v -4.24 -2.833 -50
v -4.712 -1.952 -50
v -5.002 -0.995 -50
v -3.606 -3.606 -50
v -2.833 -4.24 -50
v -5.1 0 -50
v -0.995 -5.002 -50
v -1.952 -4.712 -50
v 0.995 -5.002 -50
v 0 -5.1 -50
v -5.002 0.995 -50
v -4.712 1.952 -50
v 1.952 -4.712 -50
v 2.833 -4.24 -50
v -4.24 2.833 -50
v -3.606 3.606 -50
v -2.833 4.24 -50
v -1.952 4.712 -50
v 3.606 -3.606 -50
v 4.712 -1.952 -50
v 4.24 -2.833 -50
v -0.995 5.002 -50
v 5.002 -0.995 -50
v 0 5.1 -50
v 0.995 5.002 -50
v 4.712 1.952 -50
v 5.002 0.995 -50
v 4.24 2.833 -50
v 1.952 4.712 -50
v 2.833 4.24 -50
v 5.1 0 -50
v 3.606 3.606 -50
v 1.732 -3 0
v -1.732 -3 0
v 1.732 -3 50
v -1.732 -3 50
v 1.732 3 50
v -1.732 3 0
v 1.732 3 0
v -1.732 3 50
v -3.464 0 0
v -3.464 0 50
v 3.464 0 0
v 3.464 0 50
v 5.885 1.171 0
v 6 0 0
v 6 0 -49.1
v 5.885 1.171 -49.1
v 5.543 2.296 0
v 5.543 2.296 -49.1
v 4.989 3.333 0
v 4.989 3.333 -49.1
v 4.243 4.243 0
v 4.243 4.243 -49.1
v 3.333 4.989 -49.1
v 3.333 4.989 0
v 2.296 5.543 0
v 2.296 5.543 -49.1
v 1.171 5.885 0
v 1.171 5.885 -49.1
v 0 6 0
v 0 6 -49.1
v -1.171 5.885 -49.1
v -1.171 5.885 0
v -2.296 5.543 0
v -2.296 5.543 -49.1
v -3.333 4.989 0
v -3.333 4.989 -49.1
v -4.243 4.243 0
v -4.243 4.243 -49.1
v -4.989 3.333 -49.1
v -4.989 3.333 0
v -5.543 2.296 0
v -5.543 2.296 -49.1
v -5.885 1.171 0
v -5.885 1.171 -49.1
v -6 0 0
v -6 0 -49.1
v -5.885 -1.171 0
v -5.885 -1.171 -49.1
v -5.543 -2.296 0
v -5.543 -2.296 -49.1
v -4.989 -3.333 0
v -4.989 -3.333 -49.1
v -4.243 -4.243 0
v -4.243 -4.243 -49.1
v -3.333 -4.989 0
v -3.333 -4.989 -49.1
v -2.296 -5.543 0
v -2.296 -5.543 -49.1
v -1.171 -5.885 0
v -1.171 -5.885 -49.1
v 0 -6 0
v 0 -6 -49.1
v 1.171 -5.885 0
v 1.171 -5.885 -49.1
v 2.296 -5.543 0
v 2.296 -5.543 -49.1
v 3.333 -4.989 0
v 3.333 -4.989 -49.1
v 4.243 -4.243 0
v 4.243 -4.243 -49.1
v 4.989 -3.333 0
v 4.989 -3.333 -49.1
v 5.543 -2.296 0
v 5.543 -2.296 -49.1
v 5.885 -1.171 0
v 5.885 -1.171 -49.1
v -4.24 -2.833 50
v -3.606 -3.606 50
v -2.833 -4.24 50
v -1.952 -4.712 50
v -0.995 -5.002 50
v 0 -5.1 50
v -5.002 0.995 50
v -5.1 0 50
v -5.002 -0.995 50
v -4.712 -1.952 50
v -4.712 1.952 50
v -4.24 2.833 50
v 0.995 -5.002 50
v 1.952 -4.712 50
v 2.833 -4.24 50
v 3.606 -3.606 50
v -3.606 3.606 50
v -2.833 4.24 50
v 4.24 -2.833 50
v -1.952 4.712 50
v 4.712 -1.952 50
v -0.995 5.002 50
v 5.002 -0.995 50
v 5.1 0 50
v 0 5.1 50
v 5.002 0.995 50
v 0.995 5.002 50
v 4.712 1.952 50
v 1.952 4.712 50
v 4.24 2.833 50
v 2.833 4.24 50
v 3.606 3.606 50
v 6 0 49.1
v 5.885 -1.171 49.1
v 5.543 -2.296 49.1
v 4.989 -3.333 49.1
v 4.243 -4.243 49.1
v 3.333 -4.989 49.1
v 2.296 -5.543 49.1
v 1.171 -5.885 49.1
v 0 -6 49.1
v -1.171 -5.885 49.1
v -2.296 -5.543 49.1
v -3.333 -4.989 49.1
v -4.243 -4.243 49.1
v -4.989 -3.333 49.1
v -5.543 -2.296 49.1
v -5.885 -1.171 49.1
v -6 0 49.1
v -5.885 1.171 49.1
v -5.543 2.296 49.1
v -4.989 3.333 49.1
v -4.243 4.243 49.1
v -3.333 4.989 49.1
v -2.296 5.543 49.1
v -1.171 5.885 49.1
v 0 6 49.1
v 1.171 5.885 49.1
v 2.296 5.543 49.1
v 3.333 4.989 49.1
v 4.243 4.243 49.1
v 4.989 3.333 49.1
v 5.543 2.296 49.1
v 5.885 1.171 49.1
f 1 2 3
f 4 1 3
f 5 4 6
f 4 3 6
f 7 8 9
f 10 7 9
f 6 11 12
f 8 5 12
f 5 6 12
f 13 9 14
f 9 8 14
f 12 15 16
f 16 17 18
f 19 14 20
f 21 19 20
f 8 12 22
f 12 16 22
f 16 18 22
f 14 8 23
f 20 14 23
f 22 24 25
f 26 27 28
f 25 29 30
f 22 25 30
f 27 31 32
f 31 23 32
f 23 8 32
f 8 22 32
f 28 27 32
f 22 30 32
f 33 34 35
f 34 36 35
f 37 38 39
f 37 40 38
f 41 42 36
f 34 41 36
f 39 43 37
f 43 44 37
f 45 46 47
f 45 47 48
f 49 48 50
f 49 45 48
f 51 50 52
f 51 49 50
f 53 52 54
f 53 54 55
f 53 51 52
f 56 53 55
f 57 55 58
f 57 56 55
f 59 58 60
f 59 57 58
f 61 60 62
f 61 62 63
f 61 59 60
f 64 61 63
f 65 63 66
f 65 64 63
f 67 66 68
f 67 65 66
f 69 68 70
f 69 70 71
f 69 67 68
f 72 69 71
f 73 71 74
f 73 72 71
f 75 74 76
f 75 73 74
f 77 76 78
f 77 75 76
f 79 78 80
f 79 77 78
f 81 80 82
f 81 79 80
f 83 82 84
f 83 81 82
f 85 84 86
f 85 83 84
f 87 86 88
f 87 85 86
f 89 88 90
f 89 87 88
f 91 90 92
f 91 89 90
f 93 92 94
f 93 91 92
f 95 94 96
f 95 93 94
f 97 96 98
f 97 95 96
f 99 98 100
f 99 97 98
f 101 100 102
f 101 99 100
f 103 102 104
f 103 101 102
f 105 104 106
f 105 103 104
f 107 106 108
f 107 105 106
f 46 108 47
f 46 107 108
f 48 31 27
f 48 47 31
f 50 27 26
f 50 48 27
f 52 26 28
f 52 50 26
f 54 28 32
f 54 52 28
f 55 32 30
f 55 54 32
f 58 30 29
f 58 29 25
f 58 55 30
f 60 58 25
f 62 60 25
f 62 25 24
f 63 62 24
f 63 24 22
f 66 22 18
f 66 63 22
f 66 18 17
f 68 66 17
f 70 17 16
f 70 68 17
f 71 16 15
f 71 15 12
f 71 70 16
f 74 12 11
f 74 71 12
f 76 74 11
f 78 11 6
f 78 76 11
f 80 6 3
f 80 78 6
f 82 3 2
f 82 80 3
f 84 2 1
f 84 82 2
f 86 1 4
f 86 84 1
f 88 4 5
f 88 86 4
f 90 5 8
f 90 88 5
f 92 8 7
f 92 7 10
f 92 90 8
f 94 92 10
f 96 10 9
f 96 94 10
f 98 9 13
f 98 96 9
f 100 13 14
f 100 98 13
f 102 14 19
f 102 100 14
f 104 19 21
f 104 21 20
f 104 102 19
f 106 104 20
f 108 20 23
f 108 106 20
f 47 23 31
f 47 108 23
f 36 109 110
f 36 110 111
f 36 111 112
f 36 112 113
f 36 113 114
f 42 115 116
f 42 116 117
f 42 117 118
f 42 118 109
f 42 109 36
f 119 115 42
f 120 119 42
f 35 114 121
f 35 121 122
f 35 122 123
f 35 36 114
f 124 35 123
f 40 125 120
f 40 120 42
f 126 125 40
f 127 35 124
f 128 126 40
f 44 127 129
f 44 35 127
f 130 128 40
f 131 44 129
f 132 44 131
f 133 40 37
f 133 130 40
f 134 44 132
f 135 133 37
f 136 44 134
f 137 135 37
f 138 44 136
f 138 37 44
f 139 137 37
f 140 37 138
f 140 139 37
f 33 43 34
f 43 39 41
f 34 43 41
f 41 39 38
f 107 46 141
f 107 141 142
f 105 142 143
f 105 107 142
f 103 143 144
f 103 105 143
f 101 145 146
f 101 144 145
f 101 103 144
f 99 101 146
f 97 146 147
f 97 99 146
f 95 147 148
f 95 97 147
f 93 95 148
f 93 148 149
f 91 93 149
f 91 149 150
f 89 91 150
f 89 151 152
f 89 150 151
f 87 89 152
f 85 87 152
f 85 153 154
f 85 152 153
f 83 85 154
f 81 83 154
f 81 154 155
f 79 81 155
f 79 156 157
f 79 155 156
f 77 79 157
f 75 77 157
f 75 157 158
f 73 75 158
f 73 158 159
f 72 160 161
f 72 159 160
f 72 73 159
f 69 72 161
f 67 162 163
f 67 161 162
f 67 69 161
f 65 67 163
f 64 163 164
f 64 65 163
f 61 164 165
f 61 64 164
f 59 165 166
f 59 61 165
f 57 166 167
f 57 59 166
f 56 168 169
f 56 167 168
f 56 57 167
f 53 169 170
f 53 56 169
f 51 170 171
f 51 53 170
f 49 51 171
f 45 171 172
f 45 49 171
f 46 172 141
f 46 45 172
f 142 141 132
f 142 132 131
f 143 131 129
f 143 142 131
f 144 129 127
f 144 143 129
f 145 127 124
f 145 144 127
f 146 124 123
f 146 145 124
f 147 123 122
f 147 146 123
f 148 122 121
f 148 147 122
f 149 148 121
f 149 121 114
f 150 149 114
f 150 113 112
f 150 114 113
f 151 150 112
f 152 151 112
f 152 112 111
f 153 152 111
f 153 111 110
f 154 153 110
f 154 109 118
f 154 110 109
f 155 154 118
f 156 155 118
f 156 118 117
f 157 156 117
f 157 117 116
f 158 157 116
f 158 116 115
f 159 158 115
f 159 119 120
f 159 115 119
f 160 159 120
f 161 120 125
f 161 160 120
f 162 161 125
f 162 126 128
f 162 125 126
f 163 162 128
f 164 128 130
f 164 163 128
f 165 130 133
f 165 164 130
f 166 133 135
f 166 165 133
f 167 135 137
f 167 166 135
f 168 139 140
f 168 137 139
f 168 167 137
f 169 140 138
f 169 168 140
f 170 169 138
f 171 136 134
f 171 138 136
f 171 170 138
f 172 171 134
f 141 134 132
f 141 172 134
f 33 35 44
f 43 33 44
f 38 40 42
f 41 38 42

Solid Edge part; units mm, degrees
sketch "Sketch1" plane through (0, 0, 0) normal (0, 0, 1) x (1, 0, 0)
  circle A0 centre (0, 0) radius 6
  dimension "D1" = 12
extrude "Protrusion1" add sketch "Sketch1" along normal mid plane 100
chamfer "Chamfer1" distance 0.9 angle 45 2 edges at (-6, 0, -50) (-6, 0, 50)
sketch "Sketch2" plane through (0, 0, 50) normal (0, 0, 1) x (1, 0, 0)
  line L0 (-1.7321, 3) -> (1.7321, 3)
  line L1 (3.4641, 0) -> (1.7321, 3)
  line L2 (1.7321, -3) -> (3.4641, 0)
  line L3 (-1.7321, -3) -> (1.7321, -3)
  line L4 (-3.4641, 0) -> (-1.7321, -3)
  line L5 (-1.7321, 3) -> (-3.4641, 0)
  dimension "D1" = 6
extrude "Cutout1" cut sketch "Sketch2" against normal blind 50
properties part number "123532"
